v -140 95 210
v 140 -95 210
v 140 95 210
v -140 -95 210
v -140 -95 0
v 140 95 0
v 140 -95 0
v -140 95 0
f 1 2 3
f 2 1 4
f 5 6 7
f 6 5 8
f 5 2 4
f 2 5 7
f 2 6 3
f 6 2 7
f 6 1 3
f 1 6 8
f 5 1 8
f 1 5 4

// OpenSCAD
// Generated documentary F1 envelope proxy.
// Not manufacturing geometry, not dimensionally validated, not SimReady.
proxy_id = "993-TURBOCHARGER-K16-LEFT";
$fn = 96;

length_mm = 280;
width_mm = 190;
height_mm = 210;

translate([-length_mm / 2, -width_mm / 2, 0])
    cube([length_mm, width_mm, height_mm], center = false);
